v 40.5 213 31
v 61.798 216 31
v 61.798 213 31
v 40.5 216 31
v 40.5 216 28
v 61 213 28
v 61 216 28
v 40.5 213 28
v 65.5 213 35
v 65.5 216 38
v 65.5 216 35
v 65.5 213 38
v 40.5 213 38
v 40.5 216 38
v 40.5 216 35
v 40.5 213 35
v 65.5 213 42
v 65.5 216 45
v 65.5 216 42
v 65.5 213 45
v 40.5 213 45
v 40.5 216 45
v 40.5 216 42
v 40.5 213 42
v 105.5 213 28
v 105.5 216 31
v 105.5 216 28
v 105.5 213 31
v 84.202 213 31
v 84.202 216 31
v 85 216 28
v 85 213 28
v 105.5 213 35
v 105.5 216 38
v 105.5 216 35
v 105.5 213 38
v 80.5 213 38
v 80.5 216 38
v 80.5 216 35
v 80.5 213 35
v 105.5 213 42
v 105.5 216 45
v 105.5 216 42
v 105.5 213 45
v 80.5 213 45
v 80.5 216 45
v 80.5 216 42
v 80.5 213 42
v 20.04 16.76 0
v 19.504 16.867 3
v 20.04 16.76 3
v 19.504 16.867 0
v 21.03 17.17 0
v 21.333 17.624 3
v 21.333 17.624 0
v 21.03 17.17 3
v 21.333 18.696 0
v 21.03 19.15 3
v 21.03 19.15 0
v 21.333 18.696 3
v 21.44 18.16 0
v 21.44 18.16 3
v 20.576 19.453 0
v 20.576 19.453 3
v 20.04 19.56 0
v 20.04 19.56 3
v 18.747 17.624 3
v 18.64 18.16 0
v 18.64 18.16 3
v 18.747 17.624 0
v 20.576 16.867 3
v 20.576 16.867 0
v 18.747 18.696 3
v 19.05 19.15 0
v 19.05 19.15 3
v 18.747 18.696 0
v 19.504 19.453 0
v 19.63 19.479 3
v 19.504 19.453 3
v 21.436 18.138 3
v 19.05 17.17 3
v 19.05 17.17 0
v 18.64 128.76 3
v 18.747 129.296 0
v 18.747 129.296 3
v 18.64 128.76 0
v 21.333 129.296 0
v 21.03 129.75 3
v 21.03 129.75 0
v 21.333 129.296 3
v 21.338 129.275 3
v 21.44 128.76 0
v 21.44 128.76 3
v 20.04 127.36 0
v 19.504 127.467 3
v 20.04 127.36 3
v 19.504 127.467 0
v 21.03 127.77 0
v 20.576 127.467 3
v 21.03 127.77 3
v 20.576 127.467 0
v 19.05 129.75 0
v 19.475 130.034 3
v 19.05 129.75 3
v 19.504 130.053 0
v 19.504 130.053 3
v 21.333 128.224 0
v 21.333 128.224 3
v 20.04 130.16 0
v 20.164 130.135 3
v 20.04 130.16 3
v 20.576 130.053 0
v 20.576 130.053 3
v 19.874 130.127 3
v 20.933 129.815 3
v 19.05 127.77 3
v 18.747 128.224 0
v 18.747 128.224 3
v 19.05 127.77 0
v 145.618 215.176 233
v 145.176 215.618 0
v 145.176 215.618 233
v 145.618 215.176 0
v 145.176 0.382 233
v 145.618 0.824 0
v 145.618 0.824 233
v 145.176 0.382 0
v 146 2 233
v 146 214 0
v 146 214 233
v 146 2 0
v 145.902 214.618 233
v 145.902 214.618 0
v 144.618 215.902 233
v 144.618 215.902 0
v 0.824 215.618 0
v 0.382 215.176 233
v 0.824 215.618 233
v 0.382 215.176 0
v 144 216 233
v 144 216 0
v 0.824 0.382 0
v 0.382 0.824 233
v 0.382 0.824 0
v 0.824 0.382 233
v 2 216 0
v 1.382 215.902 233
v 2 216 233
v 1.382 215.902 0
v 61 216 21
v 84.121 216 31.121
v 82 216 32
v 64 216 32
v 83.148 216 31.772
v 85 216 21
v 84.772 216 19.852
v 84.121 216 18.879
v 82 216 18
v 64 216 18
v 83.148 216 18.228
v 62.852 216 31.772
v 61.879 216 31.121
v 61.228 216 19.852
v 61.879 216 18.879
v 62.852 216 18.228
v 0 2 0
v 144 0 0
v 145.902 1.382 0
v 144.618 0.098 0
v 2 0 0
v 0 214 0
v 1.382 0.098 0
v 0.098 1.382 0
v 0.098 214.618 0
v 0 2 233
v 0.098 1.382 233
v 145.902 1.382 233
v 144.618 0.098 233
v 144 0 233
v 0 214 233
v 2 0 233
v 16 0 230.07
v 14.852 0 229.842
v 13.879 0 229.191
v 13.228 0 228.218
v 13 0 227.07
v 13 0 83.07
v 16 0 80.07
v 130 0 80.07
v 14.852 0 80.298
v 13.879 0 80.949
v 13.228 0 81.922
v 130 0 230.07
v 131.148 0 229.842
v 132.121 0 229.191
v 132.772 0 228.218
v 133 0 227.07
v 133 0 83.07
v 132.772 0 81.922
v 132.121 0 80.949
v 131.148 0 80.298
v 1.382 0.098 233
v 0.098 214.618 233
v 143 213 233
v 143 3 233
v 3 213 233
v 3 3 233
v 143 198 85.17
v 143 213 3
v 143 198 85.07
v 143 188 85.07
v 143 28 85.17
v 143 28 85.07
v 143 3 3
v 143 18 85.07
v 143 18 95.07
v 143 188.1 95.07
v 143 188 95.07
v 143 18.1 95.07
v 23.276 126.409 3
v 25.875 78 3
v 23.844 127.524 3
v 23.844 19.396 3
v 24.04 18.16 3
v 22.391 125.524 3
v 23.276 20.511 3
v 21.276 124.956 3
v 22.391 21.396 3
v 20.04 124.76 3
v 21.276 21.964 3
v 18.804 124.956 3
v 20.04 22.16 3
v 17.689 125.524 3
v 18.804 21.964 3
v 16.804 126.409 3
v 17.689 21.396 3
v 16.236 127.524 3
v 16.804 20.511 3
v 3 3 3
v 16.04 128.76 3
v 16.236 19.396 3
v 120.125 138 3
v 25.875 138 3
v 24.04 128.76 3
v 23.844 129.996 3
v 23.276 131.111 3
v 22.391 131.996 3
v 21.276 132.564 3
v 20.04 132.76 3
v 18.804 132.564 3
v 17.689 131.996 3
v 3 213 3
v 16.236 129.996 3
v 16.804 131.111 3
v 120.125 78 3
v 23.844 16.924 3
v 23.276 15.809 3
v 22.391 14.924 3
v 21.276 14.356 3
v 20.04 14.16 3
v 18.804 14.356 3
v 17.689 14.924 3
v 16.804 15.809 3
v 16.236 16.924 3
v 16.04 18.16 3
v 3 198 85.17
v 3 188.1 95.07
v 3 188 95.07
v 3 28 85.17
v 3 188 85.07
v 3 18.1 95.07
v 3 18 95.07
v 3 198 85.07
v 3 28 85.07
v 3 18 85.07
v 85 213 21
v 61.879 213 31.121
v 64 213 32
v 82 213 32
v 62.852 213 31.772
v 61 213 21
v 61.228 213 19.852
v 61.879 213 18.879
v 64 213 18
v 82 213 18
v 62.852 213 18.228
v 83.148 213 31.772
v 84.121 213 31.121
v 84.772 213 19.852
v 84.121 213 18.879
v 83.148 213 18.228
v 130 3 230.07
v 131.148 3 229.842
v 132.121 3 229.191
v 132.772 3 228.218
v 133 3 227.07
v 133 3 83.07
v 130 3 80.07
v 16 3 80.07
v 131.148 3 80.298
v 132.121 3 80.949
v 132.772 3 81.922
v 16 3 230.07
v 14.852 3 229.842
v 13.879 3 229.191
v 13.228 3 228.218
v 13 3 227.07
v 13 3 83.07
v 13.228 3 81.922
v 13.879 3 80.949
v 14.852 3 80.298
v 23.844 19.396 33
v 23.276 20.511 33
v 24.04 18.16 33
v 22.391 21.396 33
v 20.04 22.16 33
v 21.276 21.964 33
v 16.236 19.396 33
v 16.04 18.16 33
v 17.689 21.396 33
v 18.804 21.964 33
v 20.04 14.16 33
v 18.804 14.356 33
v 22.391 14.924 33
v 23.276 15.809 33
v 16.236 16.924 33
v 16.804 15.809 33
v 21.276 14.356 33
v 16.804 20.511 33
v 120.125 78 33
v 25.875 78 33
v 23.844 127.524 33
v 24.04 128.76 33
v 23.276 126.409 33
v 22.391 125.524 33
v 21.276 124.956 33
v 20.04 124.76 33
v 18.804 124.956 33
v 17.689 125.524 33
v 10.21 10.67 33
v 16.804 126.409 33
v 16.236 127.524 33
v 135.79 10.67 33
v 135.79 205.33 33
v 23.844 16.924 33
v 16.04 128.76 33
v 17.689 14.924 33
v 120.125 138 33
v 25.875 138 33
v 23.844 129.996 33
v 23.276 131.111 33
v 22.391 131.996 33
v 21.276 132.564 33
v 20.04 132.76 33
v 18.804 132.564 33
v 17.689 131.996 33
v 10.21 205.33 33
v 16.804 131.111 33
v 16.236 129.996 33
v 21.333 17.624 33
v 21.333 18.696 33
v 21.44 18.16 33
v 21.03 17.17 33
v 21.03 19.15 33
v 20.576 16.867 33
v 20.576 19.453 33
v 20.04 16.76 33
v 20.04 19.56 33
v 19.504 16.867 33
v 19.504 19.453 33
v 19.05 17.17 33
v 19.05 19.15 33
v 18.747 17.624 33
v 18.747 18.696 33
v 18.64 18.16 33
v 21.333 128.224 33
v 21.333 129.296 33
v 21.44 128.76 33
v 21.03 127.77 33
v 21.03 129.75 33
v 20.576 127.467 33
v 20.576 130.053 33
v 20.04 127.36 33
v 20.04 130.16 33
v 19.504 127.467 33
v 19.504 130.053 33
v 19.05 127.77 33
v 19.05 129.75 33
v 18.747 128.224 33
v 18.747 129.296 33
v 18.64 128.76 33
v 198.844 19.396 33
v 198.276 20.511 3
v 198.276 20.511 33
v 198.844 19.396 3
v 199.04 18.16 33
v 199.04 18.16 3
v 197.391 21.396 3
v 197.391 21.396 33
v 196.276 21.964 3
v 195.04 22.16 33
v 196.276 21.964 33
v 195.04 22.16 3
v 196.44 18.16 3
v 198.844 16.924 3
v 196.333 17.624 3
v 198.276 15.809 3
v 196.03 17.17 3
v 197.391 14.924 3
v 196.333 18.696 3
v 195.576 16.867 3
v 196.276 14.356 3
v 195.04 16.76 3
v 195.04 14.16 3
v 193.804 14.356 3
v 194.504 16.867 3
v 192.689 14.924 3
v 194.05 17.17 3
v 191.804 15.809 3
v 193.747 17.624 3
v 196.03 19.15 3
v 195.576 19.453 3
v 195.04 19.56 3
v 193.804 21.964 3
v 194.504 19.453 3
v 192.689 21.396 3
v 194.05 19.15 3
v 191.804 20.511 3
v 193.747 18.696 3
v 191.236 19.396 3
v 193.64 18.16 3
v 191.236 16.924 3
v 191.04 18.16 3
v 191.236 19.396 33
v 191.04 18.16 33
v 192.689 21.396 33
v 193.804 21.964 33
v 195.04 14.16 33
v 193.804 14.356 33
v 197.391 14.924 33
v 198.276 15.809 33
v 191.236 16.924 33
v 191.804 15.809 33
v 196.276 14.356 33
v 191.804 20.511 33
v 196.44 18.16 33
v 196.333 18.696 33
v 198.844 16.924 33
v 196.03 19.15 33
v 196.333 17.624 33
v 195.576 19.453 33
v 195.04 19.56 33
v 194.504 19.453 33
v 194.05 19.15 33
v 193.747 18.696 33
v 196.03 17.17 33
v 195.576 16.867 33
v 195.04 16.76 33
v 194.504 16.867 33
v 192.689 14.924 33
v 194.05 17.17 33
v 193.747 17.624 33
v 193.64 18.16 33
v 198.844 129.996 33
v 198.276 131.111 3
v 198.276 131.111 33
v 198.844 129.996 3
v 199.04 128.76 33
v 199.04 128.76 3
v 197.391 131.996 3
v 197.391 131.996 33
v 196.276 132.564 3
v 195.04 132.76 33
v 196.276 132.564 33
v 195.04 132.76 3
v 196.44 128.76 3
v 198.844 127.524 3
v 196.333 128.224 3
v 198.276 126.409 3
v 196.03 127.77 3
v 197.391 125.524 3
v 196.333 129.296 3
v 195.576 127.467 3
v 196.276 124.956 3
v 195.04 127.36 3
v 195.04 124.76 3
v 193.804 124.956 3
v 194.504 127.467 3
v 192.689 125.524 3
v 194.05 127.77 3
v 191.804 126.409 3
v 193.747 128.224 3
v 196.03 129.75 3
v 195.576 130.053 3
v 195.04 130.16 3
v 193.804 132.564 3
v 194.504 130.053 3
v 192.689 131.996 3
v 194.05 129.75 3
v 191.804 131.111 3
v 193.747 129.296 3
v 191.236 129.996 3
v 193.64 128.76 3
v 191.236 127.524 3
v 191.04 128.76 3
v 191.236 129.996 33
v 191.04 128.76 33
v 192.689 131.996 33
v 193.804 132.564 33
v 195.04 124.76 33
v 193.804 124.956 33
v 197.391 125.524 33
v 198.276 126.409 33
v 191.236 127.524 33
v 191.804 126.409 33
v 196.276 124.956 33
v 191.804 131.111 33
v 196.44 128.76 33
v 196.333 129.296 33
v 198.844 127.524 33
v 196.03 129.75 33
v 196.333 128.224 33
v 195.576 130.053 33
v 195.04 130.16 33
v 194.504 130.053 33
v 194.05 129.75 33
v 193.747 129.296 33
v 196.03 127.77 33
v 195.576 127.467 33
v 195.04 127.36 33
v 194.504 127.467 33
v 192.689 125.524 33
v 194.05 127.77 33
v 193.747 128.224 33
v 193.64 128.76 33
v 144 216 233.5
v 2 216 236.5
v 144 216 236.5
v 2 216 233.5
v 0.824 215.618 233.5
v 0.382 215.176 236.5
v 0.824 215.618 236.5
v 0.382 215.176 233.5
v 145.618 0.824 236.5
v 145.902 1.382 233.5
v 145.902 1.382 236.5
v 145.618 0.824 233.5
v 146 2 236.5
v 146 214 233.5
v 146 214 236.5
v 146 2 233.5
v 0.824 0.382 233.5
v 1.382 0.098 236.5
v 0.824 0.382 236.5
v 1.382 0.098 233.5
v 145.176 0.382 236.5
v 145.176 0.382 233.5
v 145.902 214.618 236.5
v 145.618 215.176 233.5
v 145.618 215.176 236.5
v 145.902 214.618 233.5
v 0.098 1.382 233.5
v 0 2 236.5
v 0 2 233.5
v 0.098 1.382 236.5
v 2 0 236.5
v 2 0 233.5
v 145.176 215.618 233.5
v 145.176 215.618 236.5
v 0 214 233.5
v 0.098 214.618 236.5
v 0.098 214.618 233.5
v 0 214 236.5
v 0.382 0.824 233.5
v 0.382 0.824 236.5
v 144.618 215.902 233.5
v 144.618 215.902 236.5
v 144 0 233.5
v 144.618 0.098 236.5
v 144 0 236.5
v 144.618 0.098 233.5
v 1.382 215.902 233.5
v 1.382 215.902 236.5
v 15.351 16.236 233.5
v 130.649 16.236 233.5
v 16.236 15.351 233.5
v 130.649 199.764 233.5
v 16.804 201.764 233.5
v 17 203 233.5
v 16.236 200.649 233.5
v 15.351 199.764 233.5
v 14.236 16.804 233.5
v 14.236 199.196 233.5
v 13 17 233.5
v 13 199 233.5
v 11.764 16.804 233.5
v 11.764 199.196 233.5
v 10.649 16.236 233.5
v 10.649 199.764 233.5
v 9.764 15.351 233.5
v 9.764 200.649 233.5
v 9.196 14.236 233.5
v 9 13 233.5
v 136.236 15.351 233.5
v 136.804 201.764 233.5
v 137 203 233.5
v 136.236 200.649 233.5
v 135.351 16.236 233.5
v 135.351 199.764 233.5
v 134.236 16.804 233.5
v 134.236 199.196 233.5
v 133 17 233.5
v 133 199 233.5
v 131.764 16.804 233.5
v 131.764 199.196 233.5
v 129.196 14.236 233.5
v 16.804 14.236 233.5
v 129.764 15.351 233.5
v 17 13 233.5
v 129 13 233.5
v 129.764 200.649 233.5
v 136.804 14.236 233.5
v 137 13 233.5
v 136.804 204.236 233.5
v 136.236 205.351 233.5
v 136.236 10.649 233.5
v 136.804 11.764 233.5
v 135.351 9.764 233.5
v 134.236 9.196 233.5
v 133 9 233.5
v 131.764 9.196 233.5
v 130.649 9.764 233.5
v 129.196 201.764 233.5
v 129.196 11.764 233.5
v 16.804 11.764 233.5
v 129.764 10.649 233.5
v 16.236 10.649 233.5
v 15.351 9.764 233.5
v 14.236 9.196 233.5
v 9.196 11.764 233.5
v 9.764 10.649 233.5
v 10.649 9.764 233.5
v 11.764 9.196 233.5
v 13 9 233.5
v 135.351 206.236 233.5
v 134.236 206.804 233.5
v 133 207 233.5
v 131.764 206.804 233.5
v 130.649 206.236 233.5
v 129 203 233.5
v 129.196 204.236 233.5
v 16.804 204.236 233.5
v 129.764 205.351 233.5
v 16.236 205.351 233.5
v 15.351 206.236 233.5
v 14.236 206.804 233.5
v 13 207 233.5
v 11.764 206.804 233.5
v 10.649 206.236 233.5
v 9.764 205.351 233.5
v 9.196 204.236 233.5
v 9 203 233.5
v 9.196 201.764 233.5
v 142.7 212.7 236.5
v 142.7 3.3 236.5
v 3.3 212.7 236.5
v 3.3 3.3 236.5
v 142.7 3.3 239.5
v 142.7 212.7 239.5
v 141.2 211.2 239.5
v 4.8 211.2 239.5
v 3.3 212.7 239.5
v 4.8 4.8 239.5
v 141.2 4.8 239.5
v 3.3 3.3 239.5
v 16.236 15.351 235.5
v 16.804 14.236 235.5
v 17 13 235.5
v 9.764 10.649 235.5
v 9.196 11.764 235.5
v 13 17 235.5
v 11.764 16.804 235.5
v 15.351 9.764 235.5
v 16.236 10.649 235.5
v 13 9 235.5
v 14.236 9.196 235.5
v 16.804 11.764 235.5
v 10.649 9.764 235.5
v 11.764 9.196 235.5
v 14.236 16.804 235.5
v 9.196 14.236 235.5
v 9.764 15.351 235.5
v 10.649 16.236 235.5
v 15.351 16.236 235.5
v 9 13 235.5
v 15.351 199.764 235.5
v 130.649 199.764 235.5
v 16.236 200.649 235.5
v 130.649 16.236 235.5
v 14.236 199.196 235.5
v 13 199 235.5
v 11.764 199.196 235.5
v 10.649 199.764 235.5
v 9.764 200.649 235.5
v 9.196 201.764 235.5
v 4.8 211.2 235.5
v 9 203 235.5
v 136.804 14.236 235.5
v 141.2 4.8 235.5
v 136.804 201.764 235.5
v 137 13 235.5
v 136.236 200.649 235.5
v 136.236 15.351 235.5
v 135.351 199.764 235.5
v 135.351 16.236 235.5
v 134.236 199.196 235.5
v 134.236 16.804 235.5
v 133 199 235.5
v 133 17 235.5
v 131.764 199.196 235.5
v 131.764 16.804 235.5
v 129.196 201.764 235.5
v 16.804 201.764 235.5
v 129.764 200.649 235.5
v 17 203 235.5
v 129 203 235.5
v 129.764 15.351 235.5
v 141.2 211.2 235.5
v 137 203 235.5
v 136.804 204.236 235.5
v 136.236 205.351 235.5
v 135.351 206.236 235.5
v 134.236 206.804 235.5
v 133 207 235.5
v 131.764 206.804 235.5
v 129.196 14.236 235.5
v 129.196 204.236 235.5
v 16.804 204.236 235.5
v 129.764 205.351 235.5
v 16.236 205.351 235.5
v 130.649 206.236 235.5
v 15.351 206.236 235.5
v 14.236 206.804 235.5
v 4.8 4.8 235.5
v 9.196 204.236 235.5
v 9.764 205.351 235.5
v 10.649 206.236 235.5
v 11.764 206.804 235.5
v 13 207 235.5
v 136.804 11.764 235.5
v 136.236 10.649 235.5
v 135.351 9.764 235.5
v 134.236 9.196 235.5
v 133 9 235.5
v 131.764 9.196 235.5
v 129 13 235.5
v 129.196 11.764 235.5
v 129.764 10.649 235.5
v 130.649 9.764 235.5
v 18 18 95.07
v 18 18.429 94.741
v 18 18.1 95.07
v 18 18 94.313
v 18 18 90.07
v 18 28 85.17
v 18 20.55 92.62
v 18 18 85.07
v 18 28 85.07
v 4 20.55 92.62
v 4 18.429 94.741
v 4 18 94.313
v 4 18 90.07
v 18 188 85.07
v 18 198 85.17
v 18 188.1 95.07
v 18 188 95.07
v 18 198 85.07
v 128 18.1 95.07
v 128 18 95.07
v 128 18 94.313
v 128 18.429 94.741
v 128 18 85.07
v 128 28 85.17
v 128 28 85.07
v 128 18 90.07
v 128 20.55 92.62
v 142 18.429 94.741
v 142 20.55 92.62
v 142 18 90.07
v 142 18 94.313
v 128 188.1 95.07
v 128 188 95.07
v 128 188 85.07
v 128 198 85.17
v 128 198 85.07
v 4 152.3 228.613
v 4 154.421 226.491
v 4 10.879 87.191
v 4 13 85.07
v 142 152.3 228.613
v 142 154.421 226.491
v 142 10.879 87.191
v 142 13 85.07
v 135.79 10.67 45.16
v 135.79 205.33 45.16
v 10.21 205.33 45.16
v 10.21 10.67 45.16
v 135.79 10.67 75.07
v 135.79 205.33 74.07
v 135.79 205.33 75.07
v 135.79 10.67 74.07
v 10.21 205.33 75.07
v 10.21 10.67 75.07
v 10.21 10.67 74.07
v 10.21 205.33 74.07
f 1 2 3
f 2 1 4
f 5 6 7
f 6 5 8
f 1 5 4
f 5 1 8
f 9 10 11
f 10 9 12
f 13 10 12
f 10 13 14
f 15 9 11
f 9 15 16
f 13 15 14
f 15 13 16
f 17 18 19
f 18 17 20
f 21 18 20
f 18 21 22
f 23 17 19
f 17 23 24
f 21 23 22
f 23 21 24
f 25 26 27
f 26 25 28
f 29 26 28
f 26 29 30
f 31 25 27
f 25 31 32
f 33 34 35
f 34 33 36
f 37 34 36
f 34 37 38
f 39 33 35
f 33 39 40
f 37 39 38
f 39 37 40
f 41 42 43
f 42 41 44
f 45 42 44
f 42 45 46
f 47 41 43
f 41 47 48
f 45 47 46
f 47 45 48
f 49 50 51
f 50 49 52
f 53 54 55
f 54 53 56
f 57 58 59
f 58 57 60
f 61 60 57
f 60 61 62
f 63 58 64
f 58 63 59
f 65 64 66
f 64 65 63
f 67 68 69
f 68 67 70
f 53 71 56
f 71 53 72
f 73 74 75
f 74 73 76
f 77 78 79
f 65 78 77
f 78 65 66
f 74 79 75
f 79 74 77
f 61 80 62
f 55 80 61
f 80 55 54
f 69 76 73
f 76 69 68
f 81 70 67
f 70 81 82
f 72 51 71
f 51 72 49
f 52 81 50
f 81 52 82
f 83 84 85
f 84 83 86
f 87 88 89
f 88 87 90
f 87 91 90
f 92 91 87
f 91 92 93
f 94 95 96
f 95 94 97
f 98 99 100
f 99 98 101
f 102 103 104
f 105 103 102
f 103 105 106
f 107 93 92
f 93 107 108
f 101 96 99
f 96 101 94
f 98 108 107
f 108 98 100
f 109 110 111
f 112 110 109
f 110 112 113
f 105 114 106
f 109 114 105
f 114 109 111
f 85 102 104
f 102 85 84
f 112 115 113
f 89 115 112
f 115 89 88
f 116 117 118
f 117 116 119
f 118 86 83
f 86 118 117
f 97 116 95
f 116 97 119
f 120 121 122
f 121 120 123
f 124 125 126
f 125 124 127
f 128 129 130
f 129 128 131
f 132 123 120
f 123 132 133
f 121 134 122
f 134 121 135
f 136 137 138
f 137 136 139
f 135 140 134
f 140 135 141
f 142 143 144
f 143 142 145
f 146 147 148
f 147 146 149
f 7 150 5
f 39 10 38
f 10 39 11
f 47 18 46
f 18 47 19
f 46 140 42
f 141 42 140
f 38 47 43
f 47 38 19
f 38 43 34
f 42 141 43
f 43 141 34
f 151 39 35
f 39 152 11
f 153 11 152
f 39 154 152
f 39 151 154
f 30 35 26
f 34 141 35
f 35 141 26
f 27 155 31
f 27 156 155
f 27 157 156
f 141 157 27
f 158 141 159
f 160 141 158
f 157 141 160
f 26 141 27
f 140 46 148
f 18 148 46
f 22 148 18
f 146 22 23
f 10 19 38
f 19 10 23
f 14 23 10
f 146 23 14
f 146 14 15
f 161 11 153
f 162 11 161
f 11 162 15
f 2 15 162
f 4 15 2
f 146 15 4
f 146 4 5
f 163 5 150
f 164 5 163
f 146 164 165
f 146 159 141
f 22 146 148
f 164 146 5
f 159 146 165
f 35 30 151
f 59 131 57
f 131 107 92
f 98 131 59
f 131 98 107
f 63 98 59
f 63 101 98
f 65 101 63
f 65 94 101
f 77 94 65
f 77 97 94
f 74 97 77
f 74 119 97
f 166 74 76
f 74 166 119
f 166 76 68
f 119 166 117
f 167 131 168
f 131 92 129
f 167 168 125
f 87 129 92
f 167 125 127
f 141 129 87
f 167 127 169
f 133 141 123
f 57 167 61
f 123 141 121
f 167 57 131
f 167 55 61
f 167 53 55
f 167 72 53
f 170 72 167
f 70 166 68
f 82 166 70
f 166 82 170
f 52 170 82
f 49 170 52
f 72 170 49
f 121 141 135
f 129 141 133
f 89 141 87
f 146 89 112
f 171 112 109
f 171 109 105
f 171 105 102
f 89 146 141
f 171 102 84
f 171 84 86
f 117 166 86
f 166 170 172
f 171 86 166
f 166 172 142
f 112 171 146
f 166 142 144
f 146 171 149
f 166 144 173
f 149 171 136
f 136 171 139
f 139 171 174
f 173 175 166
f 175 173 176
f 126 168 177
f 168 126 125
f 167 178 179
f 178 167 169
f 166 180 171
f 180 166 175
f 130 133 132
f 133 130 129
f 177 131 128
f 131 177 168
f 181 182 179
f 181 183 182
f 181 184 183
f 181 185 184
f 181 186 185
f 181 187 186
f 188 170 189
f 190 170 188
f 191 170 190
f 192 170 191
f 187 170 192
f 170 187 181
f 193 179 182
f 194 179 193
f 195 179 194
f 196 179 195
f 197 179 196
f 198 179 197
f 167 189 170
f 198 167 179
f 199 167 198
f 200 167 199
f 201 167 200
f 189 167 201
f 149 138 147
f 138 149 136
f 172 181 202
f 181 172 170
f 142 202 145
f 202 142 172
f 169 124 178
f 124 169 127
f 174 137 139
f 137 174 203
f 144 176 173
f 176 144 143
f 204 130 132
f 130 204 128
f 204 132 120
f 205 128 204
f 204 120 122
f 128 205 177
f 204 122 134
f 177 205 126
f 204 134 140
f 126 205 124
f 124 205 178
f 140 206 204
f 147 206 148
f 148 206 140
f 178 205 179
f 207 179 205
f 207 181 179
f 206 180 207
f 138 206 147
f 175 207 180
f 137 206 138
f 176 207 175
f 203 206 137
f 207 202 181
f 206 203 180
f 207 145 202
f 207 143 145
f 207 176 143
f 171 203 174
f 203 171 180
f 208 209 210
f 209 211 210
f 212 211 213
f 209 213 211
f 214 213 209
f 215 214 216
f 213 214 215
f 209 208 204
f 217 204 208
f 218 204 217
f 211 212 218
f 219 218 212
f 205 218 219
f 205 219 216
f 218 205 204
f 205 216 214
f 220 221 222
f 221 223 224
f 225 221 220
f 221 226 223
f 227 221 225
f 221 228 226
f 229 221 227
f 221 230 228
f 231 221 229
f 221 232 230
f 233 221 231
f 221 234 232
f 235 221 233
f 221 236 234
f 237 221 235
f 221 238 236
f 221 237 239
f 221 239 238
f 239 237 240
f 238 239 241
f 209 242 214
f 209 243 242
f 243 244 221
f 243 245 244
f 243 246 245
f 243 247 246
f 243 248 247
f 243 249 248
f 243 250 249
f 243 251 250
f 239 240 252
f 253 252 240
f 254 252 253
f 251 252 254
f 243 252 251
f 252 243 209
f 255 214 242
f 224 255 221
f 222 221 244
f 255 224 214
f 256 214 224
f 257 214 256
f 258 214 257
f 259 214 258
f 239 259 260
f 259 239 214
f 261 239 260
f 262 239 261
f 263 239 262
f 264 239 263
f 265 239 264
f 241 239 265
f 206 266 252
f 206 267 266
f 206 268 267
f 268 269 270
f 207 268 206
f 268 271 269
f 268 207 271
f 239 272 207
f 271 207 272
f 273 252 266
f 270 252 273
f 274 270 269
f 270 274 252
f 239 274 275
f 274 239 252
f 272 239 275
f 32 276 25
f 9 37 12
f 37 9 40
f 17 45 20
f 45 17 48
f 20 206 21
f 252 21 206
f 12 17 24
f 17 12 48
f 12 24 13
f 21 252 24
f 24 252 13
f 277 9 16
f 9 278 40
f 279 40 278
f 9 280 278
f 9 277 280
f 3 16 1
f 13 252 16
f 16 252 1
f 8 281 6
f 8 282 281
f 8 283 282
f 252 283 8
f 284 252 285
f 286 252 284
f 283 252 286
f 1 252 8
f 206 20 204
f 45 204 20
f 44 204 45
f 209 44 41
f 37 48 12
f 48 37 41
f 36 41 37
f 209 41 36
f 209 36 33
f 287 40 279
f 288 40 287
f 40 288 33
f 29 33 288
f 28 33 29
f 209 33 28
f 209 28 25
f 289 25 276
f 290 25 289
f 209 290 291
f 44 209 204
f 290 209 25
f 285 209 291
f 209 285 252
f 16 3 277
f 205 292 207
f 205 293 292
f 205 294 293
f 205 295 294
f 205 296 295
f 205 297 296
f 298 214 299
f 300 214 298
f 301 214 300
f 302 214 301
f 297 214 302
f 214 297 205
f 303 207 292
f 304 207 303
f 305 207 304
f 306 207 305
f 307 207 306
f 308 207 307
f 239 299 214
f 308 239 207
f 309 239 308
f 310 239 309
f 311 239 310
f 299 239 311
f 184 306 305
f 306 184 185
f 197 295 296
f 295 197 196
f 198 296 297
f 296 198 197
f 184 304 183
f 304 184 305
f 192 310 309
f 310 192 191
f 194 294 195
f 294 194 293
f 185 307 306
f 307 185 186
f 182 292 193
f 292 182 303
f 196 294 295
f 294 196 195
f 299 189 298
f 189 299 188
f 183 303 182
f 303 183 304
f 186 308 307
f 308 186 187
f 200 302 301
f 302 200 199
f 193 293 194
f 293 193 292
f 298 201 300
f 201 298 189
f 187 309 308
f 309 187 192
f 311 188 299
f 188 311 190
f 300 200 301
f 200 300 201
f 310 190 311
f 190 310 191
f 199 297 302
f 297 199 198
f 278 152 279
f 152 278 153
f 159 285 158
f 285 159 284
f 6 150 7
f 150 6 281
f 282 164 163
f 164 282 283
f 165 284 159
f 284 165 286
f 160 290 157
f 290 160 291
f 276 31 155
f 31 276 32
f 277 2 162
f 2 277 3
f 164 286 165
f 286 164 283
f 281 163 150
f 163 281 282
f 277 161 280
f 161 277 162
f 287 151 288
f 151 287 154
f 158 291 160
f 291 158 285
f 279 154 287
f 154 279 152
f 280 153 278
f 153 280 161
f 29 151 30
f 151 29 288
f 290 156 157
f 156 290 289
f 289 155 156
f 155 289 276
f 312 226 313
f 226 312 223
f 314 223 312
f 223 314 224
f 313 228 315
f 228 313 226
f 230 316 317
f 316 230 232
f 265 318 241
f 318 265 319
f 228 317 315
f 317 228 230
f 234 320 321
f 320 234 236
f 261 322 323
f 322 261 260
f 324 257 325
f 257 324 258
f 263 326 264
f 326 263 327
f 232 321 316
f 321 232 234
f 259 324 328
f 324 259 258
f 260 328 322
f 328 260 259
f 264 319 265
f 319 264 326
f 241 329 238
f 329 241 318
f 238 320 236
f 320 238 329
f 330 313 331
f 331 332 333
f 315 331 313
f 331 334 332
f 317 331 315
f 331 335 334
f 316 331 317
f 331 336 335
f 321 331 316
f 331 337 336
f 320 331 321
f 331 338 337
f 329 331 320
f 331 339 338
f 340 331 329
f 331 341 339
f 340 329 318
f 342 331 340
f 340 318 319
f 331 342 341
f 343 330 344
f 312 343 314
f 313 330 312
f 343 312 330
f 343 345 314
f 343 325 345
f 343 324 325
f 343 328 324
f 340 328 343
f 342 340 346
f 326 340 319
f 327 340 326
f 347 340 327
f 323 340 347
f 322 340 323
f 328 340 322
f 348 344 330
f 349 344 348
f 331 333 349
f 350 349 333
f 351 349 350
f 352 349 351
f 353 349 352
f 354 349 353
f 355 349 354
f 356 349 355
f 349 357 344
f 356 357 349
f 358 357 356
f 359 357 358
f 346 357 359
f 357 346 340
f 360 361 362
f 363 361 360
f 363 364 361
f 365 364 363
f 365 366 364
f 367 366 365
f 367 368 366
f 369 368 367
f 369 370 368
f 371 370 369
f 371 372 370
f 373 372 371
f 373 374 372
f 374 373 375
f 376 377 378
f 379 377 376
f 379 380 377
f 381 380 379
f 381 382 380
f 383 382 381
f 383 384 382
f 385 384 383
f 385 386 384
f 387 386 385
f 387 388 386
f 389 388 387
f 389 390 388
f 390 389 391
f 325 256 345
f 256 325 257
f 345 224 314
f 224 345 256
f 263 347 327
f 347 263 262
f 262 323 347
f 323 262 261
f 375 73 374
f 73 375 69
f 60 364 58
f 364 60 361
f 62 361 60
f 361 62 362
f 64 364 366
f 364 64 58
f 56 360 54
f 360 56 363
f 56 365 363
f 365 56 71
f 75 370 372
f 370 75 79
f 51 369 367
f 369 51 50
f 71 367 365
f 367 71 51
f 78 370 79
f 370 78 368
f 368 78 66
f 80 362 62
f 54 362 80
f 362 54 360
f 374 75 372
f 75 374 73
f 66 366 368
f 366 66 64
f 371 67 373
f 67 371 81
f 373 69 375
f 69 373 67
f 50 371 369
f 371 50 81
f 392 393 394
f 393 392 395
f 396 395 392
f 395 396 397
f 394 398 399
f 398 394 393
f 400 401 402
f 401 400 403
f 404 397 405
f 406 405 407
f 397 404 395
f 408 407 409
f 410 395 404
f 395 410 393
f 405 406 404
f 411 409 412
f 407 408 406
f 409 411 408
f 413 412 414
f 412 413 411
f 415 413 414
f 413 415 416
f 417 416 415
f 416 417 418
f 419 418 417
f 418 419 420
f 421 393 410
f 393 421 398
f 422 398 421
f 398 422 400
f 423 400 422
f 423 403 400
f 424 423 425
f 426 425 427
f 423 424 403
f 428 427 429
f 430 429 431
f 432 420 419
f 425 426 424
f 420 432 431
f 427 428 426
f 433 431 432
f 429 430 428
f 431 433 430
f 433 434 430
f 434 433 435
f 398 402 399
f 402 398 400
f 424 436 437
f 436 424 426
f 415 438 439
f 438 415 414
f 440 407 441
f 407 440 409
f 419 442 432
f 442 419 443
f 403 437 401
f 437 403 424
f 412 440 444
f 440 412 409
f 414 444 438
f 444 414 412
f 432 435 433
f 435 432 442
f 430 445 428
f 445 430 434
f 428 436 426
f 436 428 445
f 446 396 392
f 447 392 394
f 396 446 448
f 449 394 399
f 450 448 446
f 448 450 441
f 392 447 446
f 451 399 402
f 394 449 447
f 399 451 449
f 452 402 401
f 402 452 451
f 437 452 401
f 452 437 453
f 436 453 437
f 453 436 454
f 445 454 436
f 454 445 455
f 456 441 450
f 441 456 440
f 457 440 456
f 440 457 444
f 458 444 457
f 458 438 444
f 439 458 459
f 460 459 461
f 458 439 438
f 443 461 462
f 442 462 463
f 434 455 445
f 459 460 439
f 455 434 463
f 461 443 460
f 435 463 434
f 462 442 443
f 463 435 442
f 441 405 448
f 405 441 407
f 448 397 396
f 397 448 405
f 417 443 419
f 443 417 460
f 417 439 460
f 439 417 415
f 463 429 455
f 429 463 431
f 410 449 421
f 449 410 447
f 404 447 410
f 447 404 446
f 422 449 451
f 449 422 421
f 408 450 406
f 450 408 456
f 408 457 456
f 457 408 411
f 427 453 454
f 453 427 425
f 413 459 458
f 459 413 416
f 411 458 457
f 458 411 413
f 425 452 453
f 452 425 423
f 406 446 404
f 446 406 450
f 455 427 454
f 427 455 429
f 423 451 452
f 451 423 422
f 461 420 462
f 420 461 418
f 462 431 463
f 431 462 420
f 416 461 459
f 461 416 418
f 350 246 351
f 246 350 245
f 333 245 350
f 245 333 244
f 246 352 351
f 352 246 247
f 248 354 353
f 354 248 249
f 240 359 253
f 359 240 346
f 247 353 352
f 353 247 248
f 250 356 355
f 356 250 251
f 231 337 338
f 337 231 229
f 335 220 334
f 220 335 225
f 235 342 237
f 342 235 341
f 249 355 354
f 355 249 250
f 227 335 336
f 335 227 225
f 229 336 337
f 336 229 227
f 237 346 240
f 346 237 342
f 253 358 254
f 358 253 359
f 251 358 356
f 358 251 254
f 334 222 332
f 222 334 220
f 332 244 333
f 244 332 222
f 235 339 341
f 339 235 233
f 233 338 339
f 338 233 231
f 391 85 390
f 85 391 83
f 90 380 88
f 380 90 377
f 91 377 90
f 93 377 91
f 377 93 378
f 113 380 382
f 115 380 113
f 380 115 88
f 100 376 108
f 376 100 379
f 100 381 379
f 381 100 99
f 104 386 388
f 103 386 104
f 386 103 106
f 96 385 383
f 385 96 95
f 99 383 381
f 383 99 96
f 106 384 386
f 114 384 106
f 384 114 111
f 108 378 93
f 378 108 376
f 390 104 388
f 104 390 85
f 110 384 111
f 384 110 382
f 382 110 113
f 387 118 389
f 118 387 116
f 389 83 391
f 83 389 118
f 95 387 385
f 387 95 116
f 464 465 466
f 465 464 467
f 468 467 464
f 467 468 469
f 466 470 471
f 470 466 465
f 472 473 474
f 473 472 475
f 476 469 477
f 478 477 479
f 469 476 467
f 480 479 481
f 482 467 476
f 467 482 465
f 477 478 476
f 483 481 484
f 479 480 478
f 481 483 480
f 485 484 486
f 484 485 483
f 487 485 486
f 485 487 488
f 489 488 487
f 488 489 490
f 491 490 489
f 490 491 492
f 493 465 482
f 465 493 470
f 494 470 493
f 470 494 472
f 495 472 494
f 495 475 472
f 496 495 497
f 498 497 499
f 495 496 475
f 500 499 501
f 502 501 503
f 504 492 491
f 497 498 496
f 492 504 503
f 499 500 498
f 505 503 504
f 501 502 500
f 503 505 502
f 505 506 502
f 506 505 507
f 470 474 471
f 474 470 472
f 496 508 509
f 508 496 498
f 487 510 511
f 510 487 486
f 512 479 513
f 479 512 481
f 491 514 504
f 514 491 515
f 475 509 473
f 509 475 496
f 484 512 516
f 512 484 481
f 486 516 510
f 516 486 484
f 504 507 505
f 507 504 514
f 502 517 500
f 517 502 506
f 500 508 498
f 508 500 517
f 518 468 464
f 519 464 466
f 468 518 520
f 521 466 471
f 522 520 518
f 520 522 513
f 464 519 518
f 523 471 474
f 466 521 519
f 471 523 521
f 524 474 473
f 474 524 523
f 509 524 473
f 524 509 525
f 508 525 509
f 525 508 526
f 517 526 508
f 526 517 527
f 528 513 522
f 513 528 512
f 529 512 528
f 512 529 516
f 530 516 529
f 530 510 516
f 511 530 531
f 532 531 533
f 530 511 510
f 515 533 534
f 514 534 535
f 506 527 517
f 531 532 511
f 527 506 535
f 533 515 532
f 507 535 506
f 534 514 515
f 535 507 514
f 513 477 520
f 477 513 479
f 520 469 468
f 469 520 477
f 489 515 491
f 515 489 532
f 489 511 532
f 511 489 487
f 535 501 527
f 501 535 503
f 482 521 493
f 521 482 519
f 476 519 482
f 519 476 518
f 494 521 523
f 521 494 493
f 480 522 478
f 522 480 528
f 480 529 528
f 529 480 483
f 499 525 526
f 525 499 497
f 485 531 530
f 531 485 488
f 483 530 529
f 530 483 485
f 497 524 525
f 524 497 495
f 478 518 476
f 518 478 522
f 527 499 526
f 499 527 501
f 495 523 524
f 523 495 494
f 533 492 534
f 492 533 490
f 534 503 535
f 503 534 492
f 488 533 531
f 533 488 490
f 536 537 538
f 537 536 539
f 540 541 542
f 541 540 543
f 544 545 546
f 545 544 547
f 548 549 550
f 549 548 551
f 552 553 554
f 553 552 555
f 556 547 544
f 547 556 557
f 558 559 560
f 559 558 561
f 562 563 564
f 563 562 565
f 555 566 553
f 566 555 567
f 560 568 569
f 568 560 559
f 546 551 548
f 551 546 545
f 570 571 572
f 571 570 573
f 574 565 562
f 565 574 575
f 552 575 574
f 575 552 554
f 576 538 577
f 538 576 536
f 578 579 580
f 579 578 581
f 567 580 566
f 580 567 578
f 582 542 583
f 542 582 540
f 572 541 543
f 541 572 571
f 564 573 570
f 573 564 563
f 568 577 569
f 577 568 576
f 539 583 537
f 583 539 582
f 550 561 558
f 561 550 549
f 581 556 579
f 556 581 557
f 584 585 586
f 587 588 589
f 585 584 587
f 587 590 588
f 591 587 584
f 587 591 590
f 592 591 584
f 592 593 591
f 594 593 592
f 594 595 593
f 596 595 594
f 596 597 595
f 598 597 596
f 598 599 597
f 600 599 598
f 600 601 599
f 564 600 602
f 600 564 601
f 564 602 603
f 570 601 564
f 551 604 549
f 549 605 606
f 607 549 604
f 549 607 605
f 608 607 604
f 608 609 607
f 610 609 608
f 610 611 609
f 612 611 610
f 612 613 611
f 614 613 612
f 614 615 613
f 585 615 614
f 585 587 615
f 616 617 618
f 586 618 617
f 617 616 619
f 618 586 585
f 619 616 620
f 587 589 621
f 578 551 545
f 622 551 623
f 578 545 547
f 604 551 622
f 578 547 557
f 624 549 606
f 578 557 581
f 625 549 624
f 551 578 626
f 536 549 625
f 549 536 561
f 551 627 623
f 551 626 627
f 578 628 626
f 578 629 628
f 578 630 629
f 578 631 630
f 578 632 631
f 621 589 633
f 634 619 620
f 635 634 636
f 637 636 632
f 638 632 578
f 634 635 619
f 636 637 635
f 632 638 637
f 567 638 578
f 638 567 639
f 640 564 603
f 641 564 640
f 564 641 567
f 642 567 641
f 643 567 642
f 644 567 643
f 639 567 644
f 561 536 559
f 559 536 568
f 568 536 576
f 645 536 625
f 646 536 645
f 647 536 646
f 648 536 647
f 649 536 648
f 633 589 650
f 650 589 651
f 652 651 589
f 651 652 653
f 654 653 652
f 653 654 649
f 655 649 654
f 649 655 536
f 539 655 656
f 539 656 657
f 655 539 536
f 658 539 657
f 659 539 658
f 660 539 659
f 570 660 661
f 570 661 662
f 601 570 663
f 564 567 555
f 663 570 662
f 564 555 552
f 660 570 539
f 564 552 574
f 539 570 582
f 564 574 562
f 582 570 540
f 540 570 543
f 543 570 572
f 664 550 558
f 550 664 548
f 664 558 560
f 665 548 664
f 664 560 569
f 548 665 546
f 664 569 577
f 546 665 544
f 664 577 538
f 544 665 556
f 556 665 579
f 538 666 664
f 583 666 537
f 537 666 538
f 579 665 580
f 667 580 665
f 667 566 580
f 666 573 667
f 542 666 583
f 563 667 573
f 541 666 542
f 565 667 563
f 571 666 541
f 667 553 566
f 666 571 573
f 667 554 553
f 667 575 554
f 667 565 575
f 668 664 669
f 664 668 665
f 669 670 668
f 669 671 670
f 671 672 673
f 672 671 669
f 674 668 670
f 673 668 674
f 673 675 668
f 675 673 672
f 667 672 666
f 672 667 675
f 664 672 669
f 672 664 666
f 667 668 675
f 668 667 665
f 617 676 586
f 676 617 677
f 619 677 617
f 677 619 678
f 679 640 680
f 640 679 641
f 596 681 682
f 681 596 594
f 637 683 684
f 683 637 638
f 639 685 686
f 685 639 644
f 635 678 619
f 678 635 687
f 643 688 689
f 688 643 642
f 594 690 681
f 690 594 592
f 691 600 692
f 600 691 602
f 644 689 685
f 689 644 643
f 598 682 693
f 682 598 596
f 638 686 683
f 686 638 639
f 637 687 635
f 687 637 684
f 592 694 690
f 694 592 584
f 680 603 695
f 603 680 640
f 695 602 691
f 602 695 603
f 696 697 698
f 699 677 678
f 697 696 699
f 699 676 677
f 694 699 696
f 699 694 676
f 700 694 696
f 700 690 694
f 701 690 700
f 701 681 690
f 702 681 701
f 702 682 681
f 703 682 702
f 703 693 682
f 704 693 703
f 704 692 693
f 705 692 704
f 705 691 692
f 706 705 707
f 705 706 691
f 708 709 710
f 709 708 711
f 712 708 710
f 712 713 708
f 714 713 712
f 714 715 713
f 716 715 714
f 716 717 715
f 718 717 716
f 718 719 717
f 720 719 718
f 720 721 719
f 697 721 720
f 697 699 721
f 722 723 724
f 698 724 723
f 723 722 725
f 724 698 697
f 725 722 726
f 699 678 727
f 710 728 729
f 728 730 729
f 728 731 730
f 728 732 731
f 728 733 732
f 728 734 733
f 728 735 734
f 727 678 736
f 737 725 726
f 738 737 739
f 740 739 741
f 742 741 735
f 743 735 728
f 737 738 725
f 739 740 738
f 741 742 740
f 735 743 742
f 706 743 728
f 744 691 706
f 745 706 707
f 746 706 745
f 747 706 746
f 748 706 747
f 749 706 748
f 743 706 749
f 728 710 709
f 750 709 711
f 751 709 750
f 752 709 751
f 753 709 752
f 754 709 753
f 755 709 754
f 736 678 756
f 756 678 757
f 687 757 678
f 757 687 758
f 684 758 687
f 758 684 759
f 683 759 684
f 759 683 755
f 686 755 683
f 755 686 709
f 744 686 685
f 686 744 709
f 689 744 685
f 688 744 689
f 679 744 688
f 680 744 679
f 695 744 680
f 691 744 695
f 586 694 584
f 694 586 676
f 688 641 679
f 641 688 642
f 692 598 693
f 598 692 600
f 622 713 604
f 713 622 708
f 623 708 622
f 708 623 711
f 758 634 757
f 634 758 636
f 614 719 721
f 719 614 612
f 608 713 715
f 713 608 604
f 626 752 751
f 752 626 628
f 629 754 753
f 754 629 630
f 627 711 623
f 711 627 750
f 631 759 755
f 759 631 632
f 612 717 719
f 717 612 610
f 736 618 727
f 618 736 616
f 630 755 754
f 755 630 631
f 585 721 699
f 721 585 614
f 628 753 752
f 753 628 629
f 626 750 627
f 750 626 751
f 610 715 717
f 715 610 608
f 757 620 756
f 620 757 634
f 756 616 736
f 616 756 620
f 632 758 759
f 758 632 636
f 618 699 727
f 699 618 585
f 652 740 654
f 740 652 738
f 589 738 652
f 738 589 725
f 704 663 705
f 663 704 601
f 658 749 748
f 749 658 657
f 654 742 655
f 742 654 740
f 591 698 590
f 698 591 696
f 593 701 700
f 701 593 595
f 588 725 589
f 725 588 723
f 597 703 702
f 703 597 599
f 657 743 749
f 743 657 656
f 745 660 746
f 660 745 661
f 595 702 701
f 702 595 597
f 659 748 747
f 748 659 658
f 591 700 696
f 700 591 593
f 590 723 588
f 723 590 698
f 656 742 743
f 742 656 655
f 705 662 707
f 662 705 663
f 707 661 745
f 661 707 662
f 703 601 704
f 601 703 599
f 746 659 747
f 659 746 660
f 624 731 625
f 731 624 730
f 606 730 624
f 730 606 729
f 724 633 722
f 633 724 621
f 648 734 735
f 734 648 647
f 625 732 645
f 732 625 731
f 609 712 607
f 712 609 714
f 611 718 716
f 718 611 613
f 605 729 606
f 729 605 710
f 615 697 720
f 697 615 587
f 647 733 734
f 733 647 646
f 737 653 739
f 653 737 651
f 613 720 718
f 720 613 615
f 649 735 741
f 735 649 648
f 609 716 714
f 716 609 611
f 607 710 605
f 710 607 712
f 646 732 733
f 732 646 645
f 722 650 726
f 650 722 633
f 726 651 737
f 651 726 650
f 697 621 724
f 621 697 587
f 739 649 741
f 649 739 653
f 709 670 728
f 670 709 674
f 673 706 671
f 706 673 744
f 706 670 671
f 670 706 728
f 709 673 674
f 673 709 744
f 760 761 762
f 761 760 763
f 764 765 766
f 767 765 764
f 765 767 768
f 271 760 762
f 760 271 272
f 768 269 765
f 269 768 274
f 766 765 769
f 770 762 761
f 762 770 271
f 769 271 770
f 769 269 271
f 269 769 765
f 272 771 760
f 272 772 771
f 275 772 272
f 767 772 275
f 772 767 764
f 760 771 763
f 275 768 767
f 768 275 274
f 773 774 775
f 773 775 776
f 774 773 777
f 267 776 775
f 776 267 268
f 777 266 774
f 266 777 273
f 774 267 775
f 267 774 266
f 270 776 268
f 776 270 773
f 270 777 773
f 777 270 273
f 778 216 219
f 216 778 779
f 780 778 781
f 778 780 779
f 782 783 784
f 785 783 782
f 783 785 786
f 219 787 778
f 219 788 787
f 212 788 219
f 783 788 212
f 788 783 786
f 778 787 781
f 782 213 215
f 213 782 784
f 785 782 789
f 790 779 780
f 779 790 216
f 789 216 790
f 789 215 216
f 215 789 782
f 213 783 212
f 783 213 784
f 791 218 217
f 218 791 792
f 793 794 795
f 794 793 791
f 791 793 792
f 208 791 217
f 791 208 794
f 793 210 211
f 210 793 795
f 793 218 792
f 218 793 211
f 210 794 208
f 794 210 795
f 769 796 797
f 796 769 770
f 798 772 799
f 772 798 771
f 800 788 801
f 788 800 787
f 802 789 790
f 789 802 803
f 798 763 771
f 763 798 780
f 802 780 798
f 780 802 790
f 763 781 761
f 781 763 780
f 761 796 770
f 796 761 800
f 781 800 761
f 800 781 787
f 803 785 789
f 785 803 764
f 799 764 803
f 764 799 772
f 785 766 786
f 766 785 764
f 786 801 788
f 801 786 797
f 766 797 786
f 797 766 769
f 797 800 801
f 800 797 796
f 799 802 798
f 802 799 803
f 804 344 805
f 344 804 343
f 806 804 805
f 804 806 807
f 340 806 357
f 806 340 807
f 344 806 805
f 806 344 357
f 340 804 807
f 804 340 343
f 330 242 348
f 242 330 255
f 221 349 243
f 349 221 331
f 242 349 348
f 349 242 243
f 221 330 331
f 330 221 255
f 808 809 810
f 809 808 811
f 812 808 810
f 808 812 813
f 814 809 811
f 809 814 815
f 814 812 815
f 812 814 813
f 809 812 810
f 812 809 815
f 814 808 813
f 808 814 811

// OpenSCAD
// Vitrine - Pepper's Ghost Enclosure
// OpenSCAD model for 3D printing
//
// Usage:
//   1. Open this file in OpenSCAD (https://openscad.org/)
//   2. Select the part to print by changing `RENDER_PART`
//   3. Export as STL (F6 → File → Export as STL)
//
// Design:
//   - Display unit (PI5-CASE-TD2) is mounted face-up on M2.5 standoffs
//   - Pi 5 bump and cables are fully contained inside the enclosure
//   - Half mirror rests on small support tabs at 45 degrees
//   - Lid is removable (magnet-attached, not glued)

/* [Render Settings] */
// Which part to render for STL export
RENDER_PART = "preview"; // [preview, body, lid, mirror_tab]

/* [Enclosure Dimensions] */
// Internal dimensions (mm)
inner_width  = 140;  // left-right (viewer perspective)
inner_depth  = 210;  // front-back
inner_height = 230;  // bottom-top (standoff 30 + case 42 + mirror space ~155 + margin)

// Wall thickness (mm)
wall = 3;

/* [Display Unit - PI5-CASE-TD2] */
// Case outer dimensions
case_width  = 125.58;
case_depth  = 194.66;
case_total_h = 42.07;  // total height including Pi bump
case_base_h  = 12.16;  // back plate thickness (flat area with M2.5 holes)

// M2.5 mounting holes on case back (from drawing)
m25_spacing_x = 175.00;  // horizontal spacing
m25_spacing_y = 110.60;  // vertical spacing
m25_inset_x   = 9.83;    // from case edge to hole center
m25_inset_y   = 7.49;    // from case edge to hole center

// Pi 5 bump dimensions (approximate from drawing)
pi_bump_w   = 94.25;
pi_bump_d   = 60;
pi_bump_h   = case_total_h - case_base_h;  // ~29.91mm

/* [Standoffs] */
standoff_h = 30;    // M2.5 standoff height (must be >= pi_bump_h)
standoff_r = 4;     // standoff outer radius
m25_hole_r = 1.4;   // M2.5 screw hole radius

/* [Viewing Window] */
window_width  = 120;
window_height = 150;
// Window bottom edge: above standoffs + case, showing mirror reflection area
window_offset_bottom = standoff_h + case_total_h + 5;

/* [Ventilation] */
vent_slot_w    = 25;
vent_slot_h    = 3;
vent_rows      = 3;
vent_cols      = 2;
vent_spacing_h = 7;
vent_spacing_w = 40;

/* [Cable Hole] */
cable_hole_w = 24;
cable_hole_h = 14;
cable_hole_r = 3;
// Cable hole vertical position: in the standoff/Pi area
cable_hole_z = standoff_h / 2;

/* [Half Mirror] */
mirror_thickness = 3;
// Mirror rests above the display unit (with clearance for case edges)
mirror_start_z = standoff_h + case_total_h + 10;  // = 82mm from bottom
mirror_projection = 155;  // active display area length

/* [Magnet Recesses] */
magnet_r = 4;     // magnet diameter 6-8mm -> radius 4mm with clearance
magnet_depth = 2; // magnet thickness
magnet_inset = 10; // from inner corner

// ============================================================
// Calculated values
// ============================================================
outer_width  = inner_width + wall * 2;   // 146mm
outer_depth  = inner_depth + wall * 2;   // 216mm
outer_height = inner_height + wall;      // body: open top

// M2.5 hole positions relative to enclosure origin
// Case is centered in the enclosure
case_offset_x = (outer_width - case_width) / 2;
case_offset_y = (outer_depth - case_depth) / 2;

// ============================================================
// Modules
// ============================================================

module rounded_box(w, d, h, r=2) {
    hull() {
        for (x = [r, w-r], y = [r, d-r]) {
            translate([x, y, 0])
                cylinder(h=h, r=r, $fn=20);
        }
    }
}

module vent_slots() {
    total_w = (vent_cols - 1) * vent_spacing_w + vent_slot_w;
    start_x = (inner_width - total_w) / 2 + wall;
    start_z = wall + standoff_h - 5;

    for (col = [0:vent_cols-1], row = [0:vent_rows-1]) {
        translate([
            start_x + col * vent_spacing_w,
            0,
            start_z + row * vent_spacing_h
        ])
            cube([vent_slot_w, wall + 1, vent_slot_h]);
    }
}

module cable_hole() {
    translate([
        (outer_width - cable_hole_w) / 2,
        0,
        wall + cable_hole_z
    ])
        hull() {
            translate([cable_hole_r, 0, cable_hole_r])
                rotate([-90, 0, 0])
                    cylinder(h=wall+1, r=cable_hole_r, $fn=16);
            translate([cable_hole_w - cable_hole_r, 0, cable_hole_r])
                rotate([-90, 0, 0])
                    cylinder(h=wall+1, r=cable_hole_r, $fn=16);
            translate([cable_hole_r, 0, cable_hole_h - cable_hole_r])
                rotate([-90, 0, 0])
                    cylinder(h=wall+1, r=cable_hole_r, $fn=16);
            translate([cable_hole_w - cable_hole_r, 0, cable_hole_h - cable_hole_r])
                rotate([-90, 0, 0])
                    cylinder(h=wall+1, r=cable_hole_r, $fn=16);
        }
}

module viewing_window() {
    wr = 3;
    translate([
        (outer_width - window_width) / 2,
        0,
        wall + window_offset_bottom
    ])
        hull() {
            for (x = [wr, window_width - wr], z = [wr, window_height - wr]) {
                translate([x, -1, z])
                    rotate([-90, 0, 0])
                        cylinder(h=wall+2, r=wr, $fn=16);
            }
        }
}

module standoff_positions() {
    // M2.5 hole positions based on PI5-CASE-TD2 drawing
    positions = [
        [case_offset_x + m25_inset_x,                    case_offset_y + m25_inset_y],
        [case_offset_x + m25_inset_x + m25_spacing_x,    case_offset_y + m25_inset_y],
        [case_offset_x + m25_inset_x,                    case_offset_y + m25_inset_y + m25_spacing_y],
        [case_offset_x + m25_inset_x + m25_spacing_x,    case_offset_y + m25_inset_y + m25_spacing_y],
    ];
    for (pos = positions) {
        translate([pos[0], pos[1], 0])
            children();
    }
}

module standoffs() {
    standoff_positions() {
        difference() {
            cylinder(h=standoff_h, r=standoff_r, $fn=20);
            translate([0, 0, -1])
                cylinder(h=standoff_h + 2, r=m25_hole_r, $fn=16);
        }
    }
}

module standoff_bottom_holes() {
    // Through-holes in bottom panel for M2.5 screws
    standoff_positions() {
        translate([0, 0, -1])
            cylinder(h=wall + 2, r=m25_hole_r, $fn=16);
    }
}

module magnet_positions_body() {
    // Magnet recesses on top edge of body walls
    positions = [
        [wall + magnet_inset,                wall + magnet_inset],
        [outer_width - wall - magnet_inset,  wall + magnet_inset],
        [wall + magnet_inset,                outer_depth - wall - magnet_inset],
        [outer_width - wall - magnet_inset,  outer_depth - wall - magnet_inset],
    ];
    for (pos = positions) {
        translate([pos[0], pos[1], 0])
            children();
    }
}

module magnet_recesses_body() {
    magnet_positions_body() {
        translate([0, 0, inner_height + wall - magnet_depth])
            cylinder(h=magnet_depth + 1, r=magnet_r, $fn=20);
    }
}

module magnet_recesses_lid() {
    magnet_positions_body() {
        translate([0, 0, -1])
            cylinder(h=magnet_depth + 1, r=magnet_r, $fn=20);
    }
}

module mirror_tab() {
    // Small support tab for half mirror (glued at 45 degrees to side wall)
    tab_w = 15;
    tab_d = 10;
    tab_h = 10;

    // Triangular cross-section: 45-degree shelf
    hull() {
        cube([tab_w, tab_d, 0.1]);
        cube([tab_w, 0.1, tab_h]);
    }
}

// ============================================================
// Main body (open-top box)
// ============================================================

module body() {
    difference() {
        // Outer shell
        rounded_box(outer_width, outer_depth, inner_height + wall, r=2);

        // Inner cavity
        translate([wall, wall, wall])
            cube([inner_width, inner_depth, inner_height + 1]);

        // Front viewing window
        viewing_window();

        // Back ventilation
        translate([0, outer_depth - wall - 0.5, 0])
            vent_slots();

        // Back cable hole
        translate([0, outer_depth - wall - 0.5, 0])
            cable_hole();

        // Bottom M2.5 through-holes
        standoff_bottom_holes();

        // Magnet recesses on top edge
        magnet_recesses_body();
    }

    // Internal: M2.5 standoffs
    translate([0, 0, wall])
        standoffs();
}

// ============================================================
// Lid (top panel, magnet-attached)
// ============================================================

module lid() {
    lip_w = 1.5;
    lip_h = 3;

    difference() {
        union() {
            // Main plate
            rounded_box(outer_width, outer_depth, wall, r=2);
            // Inner alignment lip
            translate([wall + 0.3, wall + 0.3, wall])
                cube([inner_width - 0.6, inner_depth - 0.6, lip_h]);
        }

        // Hollow out the lip (make it a frame)
        translate([wall + lip_w + 0.3, wall + lip_w + 0.3, wall - 1])
            cube([inner_width - lip_w*2 - 0.6, inner_depth - lip_w*2 - 0.6, lip_h + 2]);

        // Magnet recesses (on underside)
        magnet_recesses_lid();
    }
}

// ============================================================
// Rendering
// ============================================================

if (RENDER_PART == "preview") {
    // Full assembly preview
    color("#222") body();
    color("#333", 0.6) translate([0, 0, inner_height + wall + 0.5]) lid();

    // Mirror support tabs (4 total: 2 per side, front and back)
    color("#555") {
        // Left side - front tab
        translate([wall, wall + 15, wall + mirror_start_z])
            rotate([0, 0, 0])
                mirror_tab();
        // Left side - back tab
        translate([wall, outer_depth - wall - 25, wall + mirror_start_z])
            mirror_tab();
        // Right side - front tab
        translate([outer_width - wall, wall + 15, wall + mirror_start_z])
            mirror([1, 0, 0])
                mirror_tab();
        // Right side - back tab
        translate([outer_width - wall, outer_depth - wall - 25, wall + mirror_start_z])
            mirror([1, 0, 0])
                mirror_tab();
    }

    // Half mirror (visualization)
    color("#88ccff", 0.25)
        translate([wall + 1, wall + 10, wall + mirror_start_z])
            rotate([45, 0, 0])
                cube([inner_width - 2, 200, mirror_thickness]);

    // Display unit - back plate (visualization)
    color("#1a1a2e", 0.4)
        translate([
            case_offset_x,
            case_offset_y,
            wall + standoff_h
        ])
            cube([case_width, case_depth, case_base_h]);

    // Display unit - Pi bump (visualization)
    color("#2a2a3e", 0.4)
        translate([
            (outer_width - pi_bump_w) / 2,
            (outer_depth - pi_bump_d) / 2,
            wall
        ])
            cube([pi_bump_w, pi_bump_d, standoff_h]);

    // Display face (top, visualization)
    color("#000", 0.6)
        translate([
            case_offset_x,
            case_offset_y,
            wall + standoff_h + case_total_h - 1
        ])
            cube([case_width, case_depth, 1]);

} else if (RENDER_PART == "body") {
    body();

} else if (RENDER_PART == "lid") {
    // Print with outer face down
    lid();

} else if (RENDER_PART == "mirror_tab") {
    // Print 4 copies of this
    mirror_tab();
}
